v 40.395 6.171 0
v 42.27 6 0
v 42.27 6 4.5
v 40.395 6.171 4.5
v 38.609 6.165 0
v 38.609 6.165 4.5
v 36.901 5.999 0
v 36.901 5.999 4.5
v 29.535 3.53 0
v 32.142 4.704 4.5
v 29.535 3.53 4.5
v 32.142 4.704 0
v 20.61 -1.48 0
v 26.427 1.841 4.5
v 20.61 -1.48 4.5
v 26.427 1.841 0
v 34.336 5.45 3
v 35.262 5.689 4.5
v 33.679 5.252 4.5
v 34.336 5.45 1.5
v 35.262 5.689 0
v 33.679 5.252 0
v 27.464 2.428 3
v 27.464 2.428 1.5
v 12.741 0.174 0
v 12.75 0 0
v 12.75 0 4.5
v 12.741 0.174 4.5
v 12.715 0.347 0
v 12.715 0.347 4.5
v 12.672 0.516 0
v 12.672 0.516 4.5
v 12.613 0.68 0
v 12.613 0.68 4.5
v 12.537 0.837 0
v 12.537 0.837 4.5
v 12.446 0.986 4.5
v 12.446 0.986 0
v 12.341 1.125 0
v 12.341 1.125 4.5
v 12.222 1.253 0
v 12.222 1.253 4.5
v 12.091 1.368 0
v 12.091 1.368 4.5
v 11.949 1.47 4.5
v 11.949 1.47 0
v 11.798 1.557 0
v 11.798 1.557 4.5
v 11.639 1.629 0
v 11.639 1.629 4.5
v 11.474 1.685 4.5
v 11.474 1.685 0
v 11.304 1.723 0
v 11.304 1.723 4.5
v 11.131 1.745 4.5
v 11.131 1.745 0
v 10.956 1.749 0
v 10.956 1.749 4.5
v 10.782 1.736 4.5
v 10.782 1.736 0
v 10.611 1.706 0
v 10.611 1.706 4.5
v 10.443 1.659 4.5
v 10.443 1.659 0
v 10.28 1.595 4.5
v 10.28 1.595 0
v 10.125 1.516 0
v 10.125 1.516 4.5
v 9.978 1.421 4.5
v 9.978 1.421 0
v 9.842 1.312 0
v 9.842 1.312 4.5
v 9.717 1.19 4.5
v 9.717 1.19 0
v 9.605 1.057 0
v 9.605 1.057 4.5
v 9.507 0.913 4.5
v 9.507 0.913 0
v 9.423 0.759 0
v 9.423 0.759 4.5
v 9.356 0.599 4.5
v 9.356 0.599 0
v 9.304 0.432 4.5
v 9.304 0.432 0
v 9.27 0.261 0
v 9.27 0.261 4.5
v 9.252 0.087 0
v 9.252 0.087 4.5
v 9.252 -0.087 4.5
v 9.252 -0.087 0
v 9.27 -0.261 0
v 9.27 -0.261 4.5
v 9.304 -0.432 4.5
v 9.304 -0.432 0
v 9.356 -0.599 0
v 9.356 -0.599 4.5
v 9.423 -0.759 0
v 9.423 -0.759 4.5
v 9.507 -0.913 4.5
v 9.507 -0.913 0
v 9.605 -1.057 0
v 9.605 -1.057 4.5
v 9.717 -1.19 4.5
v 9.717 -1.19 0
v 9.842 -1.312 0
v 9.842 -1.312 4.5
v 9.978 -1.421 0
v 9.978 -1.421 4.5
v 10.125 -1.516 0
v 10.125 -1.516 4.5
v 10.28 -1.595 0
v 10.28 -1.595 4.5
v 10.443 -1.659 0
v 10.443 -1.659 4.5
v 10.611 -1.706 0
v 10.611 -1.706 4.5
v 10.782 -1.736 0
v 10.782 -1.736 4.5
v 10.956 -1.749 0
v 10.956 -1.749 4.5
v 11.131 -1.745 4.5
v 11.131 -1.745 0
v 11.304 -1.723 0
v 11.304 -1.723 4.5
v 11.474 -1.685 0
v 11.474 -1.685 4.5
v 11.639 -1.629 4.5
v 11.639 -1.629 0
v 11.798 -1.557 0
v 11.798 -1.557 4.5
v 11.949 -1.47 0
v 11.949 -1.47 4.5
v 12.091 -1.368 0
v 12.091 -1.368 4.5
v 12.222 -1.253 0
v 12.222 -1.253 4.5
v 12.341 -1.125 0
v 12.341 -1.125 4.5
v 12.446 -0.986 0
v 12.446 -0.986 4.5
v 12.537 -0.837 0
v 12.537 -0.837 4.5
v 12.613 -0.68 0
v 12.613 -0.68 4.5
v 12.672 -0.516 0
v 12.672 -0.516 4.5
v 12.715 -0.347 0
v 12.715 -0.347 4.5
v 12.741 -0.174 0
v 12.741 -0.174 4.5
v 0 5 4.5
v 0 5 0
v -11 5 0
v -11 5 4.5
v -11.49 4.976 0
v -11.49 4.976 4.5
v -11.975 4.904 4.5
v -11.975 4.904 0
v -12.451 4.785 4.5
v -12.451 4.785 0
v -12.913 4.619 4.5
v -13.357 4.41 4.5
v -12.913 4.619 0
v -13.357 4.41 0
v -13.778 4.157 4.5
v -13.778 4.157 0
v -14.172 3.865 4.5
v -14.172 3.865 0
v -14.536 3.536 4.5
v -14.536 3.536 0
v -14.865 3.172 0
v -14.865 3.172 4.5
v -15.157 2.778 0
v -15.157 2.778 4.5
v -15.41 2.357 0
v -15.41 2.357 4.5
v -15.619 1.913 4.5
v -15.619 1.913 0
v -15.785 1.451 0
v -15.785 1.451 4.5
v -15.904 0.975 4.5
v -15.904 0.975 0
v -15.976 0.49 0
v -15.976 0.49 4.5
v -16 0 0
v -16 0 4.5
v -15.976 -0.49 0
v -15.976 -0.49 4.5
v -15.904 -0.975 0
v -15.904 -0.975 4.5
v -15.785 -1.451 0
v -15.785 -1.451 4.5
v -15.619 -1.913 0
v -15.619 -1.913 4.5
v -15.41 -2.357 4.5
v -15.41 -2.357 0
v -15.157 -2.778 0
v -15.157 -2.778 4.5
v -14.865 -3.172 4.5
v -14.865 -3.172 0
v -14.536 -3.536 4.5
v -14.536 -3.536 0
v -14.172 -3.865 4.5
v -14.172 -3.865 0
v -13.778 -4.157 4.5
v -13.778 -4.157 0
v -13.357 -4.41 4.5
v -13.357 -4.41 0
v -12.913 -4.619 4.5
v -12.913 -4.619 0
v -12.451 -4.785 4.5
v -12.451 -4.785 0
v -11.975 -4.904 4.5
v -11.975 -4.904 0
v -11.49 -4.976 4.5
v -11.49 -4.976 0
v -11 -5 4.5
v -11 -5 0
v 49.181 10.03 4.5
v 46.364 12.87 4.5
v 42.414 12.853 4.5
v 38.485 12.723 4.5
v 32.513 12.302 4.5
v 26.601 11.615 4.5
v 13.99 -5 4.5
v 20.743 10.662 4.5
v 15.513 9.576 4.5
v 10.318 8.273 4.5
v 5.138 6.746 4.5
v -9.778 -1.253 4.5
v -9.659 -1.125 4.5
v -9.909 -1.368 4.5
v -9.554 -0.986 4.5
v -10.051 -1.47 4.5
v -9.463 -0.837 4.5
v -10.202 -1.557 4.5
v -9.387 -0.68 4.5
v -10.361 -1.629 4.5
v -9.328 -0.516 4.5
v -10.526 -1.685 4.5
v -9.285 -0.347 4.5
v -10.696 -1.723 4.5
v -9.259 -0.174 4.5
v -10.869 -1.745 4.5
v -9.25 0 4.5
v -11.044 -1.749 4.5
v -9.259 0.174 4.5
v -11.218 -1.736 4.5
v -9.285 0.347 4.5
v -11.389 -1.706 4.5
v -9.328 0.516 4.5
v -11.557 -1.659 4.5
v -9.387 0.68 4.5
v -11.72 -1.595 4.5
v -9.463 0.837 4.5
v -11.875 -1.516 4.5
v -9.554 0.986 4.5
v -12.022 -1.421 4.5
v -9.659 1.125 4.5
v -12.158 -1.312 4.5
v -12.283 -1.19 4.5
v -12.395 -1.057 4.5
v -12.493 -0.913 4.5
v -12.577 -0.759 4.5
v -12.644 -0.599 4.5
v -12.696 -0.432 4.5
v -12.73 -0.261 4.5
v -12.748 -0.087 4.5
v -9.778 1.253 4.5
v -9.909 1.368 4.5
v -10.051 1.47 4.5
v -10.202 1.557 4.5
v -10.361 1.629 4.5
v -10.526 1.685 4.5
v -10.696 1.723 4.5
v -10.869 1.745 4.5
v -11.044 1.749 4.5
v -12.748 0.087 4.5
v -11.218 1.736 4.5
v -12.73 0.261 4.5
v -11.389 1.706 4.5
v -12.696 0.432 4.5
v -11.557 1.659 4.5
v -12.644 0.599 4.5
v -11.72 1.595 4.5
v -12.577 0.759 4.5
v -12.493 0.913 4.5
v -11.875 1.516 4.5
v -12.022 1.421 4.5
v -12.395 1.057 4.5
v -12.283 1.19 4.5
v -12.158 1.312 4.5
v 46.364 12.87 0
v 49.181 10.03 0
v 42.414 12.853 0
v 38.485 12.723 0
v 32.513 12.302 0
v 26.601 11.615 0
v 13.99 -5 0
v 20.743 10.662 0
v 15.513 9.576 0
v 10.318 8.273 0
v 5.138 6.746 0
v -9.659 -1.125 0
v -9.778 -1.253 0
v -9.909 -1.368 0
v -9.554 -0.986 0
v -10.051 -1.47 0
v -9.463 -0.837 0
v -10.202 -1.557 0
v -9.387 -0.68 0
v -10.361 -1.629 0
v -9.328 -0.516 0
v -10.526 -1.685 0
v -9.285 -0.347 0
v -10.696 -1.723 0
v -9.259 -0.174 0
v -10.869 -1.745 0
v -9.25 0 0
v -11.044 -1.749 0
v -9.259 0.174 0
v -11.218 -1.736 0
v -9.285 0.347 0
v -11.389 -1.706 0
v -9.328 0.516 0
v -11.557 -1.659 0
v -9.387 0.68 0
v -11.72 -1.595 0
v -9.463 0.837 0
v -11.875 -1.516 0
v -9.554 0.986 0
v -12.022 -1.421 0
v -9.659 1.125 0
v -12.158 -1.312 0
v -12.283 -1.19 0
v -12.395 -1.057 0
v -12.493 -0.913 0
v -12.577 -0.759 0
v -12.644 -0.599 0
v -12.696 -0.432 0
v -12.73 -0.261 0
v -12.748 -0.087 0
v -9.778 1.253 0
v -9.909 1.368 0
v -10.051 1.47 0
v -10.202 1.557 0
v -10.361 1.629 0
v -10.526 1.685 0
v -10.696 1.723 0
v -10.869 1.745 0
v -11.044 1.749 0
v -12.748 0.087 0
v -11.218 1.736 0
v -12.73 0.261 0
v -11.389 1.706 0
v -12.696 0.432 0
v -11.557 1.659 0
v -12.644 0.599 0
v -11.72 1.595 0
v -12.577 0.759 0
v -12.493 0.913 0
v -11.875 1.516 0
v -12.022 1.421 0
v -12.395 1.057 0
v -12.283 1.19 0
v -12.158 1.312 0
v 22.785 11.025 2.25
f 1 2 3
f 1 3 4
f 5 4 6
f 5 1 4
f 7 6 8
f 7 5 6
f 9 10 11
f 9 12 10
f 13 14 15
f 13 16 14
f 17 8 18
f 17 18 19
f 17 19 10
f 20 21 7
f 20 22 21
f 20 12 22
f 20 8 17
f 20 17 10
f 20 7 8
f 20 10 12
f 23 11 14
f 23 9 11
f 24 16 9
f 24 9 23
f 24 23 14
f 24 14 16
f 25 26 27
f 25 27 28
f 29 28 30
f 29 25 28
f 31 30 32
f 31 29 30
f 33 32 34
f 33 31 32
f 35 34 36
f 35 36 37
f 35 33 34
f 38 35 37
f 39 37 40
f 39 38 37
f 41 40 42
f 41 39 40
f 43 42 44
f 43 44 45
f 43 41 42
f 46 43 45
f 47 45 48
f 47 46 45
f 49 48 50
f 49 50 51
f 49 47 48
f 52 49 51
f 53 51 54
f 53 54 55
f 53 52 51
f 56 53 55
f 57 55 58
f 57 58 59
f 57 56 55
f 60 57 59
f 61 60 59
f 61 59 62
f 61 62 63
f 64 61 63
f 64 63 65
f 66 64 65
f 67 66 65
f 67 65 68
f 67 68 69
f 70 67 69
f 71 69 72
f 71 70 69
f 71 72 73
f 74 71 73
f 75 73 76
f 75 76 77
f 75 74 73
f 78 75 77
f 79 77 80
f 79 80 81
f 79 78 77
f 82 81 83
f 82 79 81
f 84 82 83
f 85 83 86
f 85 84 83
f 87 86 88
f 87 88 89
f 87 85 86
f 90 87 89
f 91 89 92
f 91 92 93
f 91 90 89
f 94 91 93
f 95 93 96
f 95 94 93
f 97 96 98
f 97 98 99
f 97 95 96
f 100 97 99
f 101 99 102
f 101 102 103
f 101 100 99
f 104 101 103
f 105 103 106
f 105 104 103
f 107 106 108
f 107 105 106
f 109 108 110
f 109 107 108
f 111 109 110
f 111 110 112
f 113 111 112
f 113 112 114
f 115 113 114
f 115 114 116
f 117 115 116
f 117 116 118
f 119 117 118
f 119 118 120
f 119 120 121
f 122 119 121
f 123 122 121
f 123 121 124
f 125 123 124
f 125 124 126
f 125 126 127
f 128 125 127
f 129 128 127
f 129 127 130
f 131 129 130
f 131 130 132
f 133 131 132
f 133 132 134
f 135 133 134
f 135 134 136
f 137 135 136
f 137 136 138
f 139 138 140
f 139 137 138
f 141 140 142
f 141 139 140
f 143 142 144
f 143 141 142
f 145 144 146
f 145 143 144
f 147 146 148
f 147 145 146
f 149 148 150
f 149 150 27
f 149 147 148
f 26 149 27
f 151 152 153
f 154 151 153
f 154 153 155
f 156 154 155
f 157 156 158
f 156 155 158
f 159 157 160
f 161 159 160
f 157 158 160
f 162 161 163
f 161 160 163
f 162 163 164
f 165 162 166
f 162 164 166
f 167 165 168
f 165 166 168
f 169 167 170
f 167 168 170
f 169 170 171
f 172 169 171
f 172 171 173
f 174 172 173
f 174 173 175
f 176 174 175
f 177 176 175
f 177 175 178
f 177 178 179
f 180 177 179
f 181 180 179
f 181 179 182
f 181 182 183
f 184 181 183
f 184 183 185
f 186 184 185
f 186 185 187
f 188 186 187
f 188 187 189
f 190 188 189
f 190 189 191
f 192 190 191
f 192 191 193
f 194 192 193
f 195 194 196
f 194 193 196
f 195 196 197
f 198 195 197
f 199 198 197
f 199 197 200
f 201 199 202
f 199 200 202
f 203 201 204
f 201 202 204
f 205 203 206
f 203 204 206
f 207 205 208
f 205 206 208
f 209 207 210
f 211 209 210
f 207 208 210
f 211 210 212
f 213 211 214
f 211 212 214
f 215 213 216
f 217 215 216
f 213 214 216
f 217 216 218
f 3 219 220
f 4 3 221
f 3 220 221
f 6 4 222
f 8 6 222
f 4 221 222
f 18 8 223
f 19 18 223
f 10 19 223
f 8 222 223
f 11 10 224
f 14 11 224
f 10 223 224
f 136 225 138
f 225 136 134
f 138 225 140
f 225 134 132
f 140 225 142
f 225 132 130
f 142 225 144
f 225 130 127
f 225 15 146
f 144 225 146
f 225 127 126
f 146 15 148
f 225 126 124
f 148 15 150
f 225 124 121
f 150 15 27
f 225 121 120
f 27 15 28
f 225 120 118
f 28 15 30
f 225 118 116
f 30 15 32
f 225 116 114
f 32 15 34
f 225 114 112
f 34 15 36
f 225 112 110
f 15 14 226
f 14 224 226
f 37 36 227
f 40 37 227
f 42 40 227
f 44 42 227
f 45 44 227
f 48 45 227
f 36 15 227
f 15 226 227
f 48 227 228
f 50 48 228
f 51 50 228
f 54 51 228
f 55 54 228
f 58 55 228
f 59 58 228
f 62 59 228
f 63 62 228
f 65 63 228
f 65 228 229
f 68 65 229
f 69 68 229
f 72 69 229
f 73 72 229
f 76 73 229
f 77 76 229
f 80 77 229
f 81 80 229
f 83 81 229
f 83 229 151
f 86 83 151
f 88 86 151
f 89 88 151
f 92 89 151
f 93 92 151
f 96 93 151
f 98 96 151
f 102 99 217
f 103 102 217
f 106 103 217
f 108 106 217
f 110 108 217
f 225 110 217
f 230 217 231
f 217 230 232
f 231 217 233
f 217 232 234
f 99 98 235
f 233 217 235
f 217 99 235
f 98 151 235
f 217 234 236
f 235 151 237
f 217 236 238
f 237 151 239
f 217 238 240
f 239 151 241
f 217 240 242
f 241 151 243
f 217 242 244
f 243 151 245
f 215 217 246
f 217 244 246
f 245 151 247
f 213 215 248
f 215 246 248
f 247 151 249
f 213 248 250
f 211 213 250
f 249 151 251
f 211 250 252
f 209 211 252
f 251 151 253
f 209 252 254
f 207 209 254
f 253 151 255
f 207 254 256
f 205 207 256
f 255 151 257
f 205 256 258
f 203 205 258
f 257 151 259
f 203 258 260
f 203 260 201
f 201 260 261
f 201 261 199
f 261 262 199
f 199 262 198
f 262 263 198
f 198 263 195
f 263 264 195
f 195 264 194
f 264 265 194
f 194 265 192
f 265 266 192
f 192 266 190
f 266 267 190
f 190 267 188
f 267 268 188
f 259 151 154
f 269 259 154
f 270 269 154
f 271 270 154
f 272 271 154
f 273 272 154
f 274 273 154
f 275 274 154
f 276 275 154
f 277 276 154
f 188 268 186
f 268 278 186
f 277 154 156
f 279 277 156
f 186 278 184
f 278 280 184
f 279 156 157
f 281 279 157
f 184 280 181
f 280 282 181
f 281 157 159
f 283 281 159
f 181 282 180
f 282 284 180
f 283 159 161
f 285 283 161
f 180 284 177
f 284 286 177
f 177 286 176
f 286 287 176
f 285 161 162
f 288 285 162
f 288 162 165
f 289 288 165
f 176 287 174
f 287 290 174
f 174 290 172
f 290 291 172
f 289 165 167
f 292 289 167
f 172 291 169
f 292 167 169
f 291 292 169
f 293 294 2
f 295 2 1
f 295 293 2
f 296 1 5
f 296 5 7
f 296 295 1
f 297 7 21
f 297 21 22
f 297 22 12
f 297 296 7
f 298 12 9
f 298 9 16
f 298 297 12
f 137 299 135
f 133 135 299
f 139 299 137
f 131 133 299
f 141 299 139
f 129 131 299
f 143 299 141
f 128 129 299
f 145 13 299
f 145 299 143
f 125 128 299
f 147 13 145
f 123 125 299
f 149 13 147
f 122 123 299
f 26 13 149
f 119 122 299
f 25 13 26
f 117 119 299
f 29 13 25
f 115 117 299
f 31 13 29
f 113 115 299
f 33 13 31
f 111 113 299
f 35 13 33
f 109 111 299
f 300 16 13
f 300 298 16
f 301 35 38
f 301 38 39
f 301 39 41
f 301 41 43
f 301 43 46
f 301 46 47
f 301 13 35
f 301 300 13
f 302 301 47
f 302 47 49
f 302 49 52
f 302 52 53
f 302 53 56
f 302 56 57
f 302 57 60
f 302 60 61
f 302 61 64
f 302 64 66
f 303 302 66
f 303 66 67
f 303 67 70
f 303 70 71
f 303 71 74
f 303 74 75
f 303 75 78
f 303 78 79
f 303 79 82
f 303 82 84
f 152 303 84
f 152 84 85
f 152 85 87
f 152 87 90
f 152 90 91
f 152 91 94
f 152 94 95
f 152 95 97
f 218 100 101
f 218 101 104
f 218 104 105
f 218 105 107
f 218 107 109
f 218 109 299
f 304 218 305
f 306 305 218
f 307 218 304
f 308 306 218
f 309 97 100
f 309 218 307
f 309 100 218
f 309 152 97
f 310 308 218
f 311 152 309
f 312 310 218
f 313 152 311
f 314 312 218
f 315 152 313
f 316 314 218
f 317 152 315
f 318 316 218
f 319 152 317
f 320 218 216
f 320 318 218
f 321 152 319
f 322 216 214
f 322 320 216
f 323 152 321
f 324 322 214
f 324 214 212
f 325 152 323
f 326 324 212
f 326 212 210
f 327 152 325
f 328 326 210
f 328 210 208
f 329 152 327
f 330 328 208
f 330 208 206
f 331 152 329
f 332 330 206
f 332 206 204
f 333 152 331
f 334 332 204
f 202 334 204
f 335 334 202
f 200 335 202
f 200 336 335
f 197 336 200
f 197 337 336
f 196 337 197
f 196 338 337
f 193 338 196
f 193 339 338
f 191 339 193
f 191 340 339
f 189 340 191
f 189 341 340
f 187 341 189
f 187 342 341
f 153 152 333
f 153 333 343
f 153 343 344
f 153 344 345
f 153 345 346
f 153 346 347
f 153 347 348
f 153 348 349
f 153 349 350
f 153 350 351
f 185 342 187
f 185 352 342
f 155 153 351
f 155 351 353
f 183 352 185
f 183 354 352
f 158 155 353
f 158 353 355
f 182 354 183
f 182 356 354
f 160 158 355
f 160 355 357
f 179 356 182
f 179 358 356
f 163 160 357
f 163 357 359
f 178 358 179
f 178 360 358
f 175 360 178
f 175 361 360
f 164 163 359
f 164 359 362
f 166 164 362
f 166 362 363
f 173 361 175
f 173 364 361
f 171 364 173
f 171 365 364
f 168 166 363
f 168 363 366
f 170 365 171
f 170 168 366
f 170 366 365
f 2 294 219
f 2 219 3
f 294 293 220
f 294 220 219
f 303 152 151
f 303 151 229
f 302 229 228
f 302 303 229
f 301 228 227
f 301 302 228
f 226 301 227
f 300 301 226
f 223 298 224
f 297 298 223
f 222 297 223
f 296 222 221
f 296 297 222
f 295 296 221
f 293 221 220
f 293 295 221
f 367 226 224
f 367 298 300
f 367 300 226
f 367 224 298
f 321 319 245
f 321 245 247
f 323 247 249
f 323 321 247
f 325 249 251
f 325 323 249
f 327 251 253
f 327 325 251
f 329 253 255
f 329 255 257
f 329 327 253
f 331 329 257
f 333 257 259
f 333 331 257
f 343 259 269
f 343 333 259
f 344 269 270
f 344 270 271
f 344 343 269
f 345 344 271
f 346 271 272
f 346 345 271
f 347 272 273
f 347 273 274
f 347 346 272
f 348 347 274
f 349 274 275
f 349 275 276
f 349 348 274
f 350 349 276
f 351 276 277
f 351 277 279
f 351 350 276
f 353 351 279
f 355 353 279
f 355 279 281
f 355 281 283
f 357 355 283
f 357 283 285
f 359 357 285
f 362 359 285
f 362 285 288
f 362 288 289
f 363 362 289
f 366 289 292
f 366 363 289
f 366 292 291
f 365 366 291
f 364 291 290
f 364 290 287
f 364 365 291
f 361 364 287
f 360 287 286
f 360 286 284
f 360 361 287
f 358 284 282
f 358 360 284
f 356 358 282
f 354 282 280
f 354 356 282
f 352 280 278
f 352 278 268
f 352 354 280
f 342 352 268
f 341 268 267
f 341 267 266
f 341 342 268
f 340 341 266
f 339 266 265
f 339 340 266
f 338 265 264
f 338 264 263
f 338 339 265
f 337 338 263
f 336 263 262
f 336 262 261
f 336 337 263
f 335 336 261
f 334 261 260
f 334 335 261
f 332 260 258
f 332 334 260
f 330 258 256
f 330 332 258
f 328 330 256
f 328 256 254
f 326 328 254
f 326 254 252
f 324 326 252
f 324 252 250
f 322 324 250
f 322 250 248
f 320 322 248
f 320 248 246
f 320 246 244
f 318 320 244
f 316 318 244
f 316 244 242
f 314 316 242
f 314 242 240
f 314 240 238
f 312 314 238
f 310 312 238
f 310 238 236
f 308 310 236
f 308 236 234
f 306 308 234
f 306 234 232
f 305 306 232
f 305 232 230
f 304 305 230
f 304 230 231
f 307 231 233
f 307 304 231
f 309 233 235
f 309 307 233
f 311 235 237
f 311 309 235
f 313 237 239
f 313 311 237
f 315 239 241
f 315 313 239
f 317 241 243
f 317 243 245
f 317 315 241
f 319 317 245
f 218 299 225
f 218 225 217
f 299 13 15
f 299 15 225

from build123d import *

# Parameters (mm, degrees)
SKETCH1_R           = 5
SKETCH1_R_2         = 1.75
BOSS_EXTRUDE1_DEPTH = 4.5
BOSS_EXTRUDE2_START = -4.5
BOSS_EXTRUDE2_DEPTH = 4.5


with BuildPart() as part:
    # Sketch1 → Boss-Extrude1 (new body)
    # profile 1 of 3: a face of its own
    with BuildSketch(Plane.XY):
        with Locations((-11, 0)):
            Circle(SKETCH1_R)
        with Locations((-11, 0)):
            Circle(SKETCH1_R_2, mode=Mode.SUBTRACT)
    # profile 2 of 3: a face of its own
    with BuildSketch(Plane.XY):
        with Locations((11, 0)):
            Circle(SKETCH1_R)
        with Locations((11, 0)):
            Circle(SKETCH1_R_2, mode=Mode.SUBTRACT)
    # profile 3 of 3: a face of its own
    with BuildSketch(Plane.XY):
        with BuildLine():
            Line((11.000000039, 5), (-11, 5))
            ThreePointArc((-11, 5), (-7.464466094, 3.535533906), (-6, 0))
            ThreePointArc((-6, 0), (-7.464466094, -3.535533906), (-11, -5))
            Line((-11, -5), (10.999999969, -5))
            ThreePointArc((10.999999969, -5), (6, 3.5e-08), (11.000000039, 5))
        make_face()
    extrude(amount=BOSS_EXTRUDE1_DEPTH)

    # Sketch2 → Boss-Extrude2 (add)
    with BuildSketch(Plane.XY.offset(4.5).offset(BOSS_EXTRUDE2_START)):
        with BuildLine():
            Line((46.363989199, 12.87), (49.180795902, 10.03))
            Line((49.180795902, 10.03), (42.27, 6))
            add(Edge.make_bspline(
                [(42.27, 6), (33.457840426, 7.213673904), (27.801569406, 2.343916059), (20.61, -1.48)],
                knots=[0, 0, 0, 0, 1, 1, 1, 1], degree=3))
            Line((20.61, -1.48), (13.99, -5))
            Line((13.99, -5), (11, -5))
            ThreePointArc((11, -5), (16, 0), (11, 5))
            Line((11, 5), (0, 5))
            add(Edge.make_bspline(
                [(0, 5), (22.387497142, 13.115081385), (46.363989199, 12.87)],
                knots=[0, 0, 0, 1, 1, 1], degree=2))
        make_face()
    extrude(amount=BOSS_EXTRUDE2_DEPTH)


solid = part.part
